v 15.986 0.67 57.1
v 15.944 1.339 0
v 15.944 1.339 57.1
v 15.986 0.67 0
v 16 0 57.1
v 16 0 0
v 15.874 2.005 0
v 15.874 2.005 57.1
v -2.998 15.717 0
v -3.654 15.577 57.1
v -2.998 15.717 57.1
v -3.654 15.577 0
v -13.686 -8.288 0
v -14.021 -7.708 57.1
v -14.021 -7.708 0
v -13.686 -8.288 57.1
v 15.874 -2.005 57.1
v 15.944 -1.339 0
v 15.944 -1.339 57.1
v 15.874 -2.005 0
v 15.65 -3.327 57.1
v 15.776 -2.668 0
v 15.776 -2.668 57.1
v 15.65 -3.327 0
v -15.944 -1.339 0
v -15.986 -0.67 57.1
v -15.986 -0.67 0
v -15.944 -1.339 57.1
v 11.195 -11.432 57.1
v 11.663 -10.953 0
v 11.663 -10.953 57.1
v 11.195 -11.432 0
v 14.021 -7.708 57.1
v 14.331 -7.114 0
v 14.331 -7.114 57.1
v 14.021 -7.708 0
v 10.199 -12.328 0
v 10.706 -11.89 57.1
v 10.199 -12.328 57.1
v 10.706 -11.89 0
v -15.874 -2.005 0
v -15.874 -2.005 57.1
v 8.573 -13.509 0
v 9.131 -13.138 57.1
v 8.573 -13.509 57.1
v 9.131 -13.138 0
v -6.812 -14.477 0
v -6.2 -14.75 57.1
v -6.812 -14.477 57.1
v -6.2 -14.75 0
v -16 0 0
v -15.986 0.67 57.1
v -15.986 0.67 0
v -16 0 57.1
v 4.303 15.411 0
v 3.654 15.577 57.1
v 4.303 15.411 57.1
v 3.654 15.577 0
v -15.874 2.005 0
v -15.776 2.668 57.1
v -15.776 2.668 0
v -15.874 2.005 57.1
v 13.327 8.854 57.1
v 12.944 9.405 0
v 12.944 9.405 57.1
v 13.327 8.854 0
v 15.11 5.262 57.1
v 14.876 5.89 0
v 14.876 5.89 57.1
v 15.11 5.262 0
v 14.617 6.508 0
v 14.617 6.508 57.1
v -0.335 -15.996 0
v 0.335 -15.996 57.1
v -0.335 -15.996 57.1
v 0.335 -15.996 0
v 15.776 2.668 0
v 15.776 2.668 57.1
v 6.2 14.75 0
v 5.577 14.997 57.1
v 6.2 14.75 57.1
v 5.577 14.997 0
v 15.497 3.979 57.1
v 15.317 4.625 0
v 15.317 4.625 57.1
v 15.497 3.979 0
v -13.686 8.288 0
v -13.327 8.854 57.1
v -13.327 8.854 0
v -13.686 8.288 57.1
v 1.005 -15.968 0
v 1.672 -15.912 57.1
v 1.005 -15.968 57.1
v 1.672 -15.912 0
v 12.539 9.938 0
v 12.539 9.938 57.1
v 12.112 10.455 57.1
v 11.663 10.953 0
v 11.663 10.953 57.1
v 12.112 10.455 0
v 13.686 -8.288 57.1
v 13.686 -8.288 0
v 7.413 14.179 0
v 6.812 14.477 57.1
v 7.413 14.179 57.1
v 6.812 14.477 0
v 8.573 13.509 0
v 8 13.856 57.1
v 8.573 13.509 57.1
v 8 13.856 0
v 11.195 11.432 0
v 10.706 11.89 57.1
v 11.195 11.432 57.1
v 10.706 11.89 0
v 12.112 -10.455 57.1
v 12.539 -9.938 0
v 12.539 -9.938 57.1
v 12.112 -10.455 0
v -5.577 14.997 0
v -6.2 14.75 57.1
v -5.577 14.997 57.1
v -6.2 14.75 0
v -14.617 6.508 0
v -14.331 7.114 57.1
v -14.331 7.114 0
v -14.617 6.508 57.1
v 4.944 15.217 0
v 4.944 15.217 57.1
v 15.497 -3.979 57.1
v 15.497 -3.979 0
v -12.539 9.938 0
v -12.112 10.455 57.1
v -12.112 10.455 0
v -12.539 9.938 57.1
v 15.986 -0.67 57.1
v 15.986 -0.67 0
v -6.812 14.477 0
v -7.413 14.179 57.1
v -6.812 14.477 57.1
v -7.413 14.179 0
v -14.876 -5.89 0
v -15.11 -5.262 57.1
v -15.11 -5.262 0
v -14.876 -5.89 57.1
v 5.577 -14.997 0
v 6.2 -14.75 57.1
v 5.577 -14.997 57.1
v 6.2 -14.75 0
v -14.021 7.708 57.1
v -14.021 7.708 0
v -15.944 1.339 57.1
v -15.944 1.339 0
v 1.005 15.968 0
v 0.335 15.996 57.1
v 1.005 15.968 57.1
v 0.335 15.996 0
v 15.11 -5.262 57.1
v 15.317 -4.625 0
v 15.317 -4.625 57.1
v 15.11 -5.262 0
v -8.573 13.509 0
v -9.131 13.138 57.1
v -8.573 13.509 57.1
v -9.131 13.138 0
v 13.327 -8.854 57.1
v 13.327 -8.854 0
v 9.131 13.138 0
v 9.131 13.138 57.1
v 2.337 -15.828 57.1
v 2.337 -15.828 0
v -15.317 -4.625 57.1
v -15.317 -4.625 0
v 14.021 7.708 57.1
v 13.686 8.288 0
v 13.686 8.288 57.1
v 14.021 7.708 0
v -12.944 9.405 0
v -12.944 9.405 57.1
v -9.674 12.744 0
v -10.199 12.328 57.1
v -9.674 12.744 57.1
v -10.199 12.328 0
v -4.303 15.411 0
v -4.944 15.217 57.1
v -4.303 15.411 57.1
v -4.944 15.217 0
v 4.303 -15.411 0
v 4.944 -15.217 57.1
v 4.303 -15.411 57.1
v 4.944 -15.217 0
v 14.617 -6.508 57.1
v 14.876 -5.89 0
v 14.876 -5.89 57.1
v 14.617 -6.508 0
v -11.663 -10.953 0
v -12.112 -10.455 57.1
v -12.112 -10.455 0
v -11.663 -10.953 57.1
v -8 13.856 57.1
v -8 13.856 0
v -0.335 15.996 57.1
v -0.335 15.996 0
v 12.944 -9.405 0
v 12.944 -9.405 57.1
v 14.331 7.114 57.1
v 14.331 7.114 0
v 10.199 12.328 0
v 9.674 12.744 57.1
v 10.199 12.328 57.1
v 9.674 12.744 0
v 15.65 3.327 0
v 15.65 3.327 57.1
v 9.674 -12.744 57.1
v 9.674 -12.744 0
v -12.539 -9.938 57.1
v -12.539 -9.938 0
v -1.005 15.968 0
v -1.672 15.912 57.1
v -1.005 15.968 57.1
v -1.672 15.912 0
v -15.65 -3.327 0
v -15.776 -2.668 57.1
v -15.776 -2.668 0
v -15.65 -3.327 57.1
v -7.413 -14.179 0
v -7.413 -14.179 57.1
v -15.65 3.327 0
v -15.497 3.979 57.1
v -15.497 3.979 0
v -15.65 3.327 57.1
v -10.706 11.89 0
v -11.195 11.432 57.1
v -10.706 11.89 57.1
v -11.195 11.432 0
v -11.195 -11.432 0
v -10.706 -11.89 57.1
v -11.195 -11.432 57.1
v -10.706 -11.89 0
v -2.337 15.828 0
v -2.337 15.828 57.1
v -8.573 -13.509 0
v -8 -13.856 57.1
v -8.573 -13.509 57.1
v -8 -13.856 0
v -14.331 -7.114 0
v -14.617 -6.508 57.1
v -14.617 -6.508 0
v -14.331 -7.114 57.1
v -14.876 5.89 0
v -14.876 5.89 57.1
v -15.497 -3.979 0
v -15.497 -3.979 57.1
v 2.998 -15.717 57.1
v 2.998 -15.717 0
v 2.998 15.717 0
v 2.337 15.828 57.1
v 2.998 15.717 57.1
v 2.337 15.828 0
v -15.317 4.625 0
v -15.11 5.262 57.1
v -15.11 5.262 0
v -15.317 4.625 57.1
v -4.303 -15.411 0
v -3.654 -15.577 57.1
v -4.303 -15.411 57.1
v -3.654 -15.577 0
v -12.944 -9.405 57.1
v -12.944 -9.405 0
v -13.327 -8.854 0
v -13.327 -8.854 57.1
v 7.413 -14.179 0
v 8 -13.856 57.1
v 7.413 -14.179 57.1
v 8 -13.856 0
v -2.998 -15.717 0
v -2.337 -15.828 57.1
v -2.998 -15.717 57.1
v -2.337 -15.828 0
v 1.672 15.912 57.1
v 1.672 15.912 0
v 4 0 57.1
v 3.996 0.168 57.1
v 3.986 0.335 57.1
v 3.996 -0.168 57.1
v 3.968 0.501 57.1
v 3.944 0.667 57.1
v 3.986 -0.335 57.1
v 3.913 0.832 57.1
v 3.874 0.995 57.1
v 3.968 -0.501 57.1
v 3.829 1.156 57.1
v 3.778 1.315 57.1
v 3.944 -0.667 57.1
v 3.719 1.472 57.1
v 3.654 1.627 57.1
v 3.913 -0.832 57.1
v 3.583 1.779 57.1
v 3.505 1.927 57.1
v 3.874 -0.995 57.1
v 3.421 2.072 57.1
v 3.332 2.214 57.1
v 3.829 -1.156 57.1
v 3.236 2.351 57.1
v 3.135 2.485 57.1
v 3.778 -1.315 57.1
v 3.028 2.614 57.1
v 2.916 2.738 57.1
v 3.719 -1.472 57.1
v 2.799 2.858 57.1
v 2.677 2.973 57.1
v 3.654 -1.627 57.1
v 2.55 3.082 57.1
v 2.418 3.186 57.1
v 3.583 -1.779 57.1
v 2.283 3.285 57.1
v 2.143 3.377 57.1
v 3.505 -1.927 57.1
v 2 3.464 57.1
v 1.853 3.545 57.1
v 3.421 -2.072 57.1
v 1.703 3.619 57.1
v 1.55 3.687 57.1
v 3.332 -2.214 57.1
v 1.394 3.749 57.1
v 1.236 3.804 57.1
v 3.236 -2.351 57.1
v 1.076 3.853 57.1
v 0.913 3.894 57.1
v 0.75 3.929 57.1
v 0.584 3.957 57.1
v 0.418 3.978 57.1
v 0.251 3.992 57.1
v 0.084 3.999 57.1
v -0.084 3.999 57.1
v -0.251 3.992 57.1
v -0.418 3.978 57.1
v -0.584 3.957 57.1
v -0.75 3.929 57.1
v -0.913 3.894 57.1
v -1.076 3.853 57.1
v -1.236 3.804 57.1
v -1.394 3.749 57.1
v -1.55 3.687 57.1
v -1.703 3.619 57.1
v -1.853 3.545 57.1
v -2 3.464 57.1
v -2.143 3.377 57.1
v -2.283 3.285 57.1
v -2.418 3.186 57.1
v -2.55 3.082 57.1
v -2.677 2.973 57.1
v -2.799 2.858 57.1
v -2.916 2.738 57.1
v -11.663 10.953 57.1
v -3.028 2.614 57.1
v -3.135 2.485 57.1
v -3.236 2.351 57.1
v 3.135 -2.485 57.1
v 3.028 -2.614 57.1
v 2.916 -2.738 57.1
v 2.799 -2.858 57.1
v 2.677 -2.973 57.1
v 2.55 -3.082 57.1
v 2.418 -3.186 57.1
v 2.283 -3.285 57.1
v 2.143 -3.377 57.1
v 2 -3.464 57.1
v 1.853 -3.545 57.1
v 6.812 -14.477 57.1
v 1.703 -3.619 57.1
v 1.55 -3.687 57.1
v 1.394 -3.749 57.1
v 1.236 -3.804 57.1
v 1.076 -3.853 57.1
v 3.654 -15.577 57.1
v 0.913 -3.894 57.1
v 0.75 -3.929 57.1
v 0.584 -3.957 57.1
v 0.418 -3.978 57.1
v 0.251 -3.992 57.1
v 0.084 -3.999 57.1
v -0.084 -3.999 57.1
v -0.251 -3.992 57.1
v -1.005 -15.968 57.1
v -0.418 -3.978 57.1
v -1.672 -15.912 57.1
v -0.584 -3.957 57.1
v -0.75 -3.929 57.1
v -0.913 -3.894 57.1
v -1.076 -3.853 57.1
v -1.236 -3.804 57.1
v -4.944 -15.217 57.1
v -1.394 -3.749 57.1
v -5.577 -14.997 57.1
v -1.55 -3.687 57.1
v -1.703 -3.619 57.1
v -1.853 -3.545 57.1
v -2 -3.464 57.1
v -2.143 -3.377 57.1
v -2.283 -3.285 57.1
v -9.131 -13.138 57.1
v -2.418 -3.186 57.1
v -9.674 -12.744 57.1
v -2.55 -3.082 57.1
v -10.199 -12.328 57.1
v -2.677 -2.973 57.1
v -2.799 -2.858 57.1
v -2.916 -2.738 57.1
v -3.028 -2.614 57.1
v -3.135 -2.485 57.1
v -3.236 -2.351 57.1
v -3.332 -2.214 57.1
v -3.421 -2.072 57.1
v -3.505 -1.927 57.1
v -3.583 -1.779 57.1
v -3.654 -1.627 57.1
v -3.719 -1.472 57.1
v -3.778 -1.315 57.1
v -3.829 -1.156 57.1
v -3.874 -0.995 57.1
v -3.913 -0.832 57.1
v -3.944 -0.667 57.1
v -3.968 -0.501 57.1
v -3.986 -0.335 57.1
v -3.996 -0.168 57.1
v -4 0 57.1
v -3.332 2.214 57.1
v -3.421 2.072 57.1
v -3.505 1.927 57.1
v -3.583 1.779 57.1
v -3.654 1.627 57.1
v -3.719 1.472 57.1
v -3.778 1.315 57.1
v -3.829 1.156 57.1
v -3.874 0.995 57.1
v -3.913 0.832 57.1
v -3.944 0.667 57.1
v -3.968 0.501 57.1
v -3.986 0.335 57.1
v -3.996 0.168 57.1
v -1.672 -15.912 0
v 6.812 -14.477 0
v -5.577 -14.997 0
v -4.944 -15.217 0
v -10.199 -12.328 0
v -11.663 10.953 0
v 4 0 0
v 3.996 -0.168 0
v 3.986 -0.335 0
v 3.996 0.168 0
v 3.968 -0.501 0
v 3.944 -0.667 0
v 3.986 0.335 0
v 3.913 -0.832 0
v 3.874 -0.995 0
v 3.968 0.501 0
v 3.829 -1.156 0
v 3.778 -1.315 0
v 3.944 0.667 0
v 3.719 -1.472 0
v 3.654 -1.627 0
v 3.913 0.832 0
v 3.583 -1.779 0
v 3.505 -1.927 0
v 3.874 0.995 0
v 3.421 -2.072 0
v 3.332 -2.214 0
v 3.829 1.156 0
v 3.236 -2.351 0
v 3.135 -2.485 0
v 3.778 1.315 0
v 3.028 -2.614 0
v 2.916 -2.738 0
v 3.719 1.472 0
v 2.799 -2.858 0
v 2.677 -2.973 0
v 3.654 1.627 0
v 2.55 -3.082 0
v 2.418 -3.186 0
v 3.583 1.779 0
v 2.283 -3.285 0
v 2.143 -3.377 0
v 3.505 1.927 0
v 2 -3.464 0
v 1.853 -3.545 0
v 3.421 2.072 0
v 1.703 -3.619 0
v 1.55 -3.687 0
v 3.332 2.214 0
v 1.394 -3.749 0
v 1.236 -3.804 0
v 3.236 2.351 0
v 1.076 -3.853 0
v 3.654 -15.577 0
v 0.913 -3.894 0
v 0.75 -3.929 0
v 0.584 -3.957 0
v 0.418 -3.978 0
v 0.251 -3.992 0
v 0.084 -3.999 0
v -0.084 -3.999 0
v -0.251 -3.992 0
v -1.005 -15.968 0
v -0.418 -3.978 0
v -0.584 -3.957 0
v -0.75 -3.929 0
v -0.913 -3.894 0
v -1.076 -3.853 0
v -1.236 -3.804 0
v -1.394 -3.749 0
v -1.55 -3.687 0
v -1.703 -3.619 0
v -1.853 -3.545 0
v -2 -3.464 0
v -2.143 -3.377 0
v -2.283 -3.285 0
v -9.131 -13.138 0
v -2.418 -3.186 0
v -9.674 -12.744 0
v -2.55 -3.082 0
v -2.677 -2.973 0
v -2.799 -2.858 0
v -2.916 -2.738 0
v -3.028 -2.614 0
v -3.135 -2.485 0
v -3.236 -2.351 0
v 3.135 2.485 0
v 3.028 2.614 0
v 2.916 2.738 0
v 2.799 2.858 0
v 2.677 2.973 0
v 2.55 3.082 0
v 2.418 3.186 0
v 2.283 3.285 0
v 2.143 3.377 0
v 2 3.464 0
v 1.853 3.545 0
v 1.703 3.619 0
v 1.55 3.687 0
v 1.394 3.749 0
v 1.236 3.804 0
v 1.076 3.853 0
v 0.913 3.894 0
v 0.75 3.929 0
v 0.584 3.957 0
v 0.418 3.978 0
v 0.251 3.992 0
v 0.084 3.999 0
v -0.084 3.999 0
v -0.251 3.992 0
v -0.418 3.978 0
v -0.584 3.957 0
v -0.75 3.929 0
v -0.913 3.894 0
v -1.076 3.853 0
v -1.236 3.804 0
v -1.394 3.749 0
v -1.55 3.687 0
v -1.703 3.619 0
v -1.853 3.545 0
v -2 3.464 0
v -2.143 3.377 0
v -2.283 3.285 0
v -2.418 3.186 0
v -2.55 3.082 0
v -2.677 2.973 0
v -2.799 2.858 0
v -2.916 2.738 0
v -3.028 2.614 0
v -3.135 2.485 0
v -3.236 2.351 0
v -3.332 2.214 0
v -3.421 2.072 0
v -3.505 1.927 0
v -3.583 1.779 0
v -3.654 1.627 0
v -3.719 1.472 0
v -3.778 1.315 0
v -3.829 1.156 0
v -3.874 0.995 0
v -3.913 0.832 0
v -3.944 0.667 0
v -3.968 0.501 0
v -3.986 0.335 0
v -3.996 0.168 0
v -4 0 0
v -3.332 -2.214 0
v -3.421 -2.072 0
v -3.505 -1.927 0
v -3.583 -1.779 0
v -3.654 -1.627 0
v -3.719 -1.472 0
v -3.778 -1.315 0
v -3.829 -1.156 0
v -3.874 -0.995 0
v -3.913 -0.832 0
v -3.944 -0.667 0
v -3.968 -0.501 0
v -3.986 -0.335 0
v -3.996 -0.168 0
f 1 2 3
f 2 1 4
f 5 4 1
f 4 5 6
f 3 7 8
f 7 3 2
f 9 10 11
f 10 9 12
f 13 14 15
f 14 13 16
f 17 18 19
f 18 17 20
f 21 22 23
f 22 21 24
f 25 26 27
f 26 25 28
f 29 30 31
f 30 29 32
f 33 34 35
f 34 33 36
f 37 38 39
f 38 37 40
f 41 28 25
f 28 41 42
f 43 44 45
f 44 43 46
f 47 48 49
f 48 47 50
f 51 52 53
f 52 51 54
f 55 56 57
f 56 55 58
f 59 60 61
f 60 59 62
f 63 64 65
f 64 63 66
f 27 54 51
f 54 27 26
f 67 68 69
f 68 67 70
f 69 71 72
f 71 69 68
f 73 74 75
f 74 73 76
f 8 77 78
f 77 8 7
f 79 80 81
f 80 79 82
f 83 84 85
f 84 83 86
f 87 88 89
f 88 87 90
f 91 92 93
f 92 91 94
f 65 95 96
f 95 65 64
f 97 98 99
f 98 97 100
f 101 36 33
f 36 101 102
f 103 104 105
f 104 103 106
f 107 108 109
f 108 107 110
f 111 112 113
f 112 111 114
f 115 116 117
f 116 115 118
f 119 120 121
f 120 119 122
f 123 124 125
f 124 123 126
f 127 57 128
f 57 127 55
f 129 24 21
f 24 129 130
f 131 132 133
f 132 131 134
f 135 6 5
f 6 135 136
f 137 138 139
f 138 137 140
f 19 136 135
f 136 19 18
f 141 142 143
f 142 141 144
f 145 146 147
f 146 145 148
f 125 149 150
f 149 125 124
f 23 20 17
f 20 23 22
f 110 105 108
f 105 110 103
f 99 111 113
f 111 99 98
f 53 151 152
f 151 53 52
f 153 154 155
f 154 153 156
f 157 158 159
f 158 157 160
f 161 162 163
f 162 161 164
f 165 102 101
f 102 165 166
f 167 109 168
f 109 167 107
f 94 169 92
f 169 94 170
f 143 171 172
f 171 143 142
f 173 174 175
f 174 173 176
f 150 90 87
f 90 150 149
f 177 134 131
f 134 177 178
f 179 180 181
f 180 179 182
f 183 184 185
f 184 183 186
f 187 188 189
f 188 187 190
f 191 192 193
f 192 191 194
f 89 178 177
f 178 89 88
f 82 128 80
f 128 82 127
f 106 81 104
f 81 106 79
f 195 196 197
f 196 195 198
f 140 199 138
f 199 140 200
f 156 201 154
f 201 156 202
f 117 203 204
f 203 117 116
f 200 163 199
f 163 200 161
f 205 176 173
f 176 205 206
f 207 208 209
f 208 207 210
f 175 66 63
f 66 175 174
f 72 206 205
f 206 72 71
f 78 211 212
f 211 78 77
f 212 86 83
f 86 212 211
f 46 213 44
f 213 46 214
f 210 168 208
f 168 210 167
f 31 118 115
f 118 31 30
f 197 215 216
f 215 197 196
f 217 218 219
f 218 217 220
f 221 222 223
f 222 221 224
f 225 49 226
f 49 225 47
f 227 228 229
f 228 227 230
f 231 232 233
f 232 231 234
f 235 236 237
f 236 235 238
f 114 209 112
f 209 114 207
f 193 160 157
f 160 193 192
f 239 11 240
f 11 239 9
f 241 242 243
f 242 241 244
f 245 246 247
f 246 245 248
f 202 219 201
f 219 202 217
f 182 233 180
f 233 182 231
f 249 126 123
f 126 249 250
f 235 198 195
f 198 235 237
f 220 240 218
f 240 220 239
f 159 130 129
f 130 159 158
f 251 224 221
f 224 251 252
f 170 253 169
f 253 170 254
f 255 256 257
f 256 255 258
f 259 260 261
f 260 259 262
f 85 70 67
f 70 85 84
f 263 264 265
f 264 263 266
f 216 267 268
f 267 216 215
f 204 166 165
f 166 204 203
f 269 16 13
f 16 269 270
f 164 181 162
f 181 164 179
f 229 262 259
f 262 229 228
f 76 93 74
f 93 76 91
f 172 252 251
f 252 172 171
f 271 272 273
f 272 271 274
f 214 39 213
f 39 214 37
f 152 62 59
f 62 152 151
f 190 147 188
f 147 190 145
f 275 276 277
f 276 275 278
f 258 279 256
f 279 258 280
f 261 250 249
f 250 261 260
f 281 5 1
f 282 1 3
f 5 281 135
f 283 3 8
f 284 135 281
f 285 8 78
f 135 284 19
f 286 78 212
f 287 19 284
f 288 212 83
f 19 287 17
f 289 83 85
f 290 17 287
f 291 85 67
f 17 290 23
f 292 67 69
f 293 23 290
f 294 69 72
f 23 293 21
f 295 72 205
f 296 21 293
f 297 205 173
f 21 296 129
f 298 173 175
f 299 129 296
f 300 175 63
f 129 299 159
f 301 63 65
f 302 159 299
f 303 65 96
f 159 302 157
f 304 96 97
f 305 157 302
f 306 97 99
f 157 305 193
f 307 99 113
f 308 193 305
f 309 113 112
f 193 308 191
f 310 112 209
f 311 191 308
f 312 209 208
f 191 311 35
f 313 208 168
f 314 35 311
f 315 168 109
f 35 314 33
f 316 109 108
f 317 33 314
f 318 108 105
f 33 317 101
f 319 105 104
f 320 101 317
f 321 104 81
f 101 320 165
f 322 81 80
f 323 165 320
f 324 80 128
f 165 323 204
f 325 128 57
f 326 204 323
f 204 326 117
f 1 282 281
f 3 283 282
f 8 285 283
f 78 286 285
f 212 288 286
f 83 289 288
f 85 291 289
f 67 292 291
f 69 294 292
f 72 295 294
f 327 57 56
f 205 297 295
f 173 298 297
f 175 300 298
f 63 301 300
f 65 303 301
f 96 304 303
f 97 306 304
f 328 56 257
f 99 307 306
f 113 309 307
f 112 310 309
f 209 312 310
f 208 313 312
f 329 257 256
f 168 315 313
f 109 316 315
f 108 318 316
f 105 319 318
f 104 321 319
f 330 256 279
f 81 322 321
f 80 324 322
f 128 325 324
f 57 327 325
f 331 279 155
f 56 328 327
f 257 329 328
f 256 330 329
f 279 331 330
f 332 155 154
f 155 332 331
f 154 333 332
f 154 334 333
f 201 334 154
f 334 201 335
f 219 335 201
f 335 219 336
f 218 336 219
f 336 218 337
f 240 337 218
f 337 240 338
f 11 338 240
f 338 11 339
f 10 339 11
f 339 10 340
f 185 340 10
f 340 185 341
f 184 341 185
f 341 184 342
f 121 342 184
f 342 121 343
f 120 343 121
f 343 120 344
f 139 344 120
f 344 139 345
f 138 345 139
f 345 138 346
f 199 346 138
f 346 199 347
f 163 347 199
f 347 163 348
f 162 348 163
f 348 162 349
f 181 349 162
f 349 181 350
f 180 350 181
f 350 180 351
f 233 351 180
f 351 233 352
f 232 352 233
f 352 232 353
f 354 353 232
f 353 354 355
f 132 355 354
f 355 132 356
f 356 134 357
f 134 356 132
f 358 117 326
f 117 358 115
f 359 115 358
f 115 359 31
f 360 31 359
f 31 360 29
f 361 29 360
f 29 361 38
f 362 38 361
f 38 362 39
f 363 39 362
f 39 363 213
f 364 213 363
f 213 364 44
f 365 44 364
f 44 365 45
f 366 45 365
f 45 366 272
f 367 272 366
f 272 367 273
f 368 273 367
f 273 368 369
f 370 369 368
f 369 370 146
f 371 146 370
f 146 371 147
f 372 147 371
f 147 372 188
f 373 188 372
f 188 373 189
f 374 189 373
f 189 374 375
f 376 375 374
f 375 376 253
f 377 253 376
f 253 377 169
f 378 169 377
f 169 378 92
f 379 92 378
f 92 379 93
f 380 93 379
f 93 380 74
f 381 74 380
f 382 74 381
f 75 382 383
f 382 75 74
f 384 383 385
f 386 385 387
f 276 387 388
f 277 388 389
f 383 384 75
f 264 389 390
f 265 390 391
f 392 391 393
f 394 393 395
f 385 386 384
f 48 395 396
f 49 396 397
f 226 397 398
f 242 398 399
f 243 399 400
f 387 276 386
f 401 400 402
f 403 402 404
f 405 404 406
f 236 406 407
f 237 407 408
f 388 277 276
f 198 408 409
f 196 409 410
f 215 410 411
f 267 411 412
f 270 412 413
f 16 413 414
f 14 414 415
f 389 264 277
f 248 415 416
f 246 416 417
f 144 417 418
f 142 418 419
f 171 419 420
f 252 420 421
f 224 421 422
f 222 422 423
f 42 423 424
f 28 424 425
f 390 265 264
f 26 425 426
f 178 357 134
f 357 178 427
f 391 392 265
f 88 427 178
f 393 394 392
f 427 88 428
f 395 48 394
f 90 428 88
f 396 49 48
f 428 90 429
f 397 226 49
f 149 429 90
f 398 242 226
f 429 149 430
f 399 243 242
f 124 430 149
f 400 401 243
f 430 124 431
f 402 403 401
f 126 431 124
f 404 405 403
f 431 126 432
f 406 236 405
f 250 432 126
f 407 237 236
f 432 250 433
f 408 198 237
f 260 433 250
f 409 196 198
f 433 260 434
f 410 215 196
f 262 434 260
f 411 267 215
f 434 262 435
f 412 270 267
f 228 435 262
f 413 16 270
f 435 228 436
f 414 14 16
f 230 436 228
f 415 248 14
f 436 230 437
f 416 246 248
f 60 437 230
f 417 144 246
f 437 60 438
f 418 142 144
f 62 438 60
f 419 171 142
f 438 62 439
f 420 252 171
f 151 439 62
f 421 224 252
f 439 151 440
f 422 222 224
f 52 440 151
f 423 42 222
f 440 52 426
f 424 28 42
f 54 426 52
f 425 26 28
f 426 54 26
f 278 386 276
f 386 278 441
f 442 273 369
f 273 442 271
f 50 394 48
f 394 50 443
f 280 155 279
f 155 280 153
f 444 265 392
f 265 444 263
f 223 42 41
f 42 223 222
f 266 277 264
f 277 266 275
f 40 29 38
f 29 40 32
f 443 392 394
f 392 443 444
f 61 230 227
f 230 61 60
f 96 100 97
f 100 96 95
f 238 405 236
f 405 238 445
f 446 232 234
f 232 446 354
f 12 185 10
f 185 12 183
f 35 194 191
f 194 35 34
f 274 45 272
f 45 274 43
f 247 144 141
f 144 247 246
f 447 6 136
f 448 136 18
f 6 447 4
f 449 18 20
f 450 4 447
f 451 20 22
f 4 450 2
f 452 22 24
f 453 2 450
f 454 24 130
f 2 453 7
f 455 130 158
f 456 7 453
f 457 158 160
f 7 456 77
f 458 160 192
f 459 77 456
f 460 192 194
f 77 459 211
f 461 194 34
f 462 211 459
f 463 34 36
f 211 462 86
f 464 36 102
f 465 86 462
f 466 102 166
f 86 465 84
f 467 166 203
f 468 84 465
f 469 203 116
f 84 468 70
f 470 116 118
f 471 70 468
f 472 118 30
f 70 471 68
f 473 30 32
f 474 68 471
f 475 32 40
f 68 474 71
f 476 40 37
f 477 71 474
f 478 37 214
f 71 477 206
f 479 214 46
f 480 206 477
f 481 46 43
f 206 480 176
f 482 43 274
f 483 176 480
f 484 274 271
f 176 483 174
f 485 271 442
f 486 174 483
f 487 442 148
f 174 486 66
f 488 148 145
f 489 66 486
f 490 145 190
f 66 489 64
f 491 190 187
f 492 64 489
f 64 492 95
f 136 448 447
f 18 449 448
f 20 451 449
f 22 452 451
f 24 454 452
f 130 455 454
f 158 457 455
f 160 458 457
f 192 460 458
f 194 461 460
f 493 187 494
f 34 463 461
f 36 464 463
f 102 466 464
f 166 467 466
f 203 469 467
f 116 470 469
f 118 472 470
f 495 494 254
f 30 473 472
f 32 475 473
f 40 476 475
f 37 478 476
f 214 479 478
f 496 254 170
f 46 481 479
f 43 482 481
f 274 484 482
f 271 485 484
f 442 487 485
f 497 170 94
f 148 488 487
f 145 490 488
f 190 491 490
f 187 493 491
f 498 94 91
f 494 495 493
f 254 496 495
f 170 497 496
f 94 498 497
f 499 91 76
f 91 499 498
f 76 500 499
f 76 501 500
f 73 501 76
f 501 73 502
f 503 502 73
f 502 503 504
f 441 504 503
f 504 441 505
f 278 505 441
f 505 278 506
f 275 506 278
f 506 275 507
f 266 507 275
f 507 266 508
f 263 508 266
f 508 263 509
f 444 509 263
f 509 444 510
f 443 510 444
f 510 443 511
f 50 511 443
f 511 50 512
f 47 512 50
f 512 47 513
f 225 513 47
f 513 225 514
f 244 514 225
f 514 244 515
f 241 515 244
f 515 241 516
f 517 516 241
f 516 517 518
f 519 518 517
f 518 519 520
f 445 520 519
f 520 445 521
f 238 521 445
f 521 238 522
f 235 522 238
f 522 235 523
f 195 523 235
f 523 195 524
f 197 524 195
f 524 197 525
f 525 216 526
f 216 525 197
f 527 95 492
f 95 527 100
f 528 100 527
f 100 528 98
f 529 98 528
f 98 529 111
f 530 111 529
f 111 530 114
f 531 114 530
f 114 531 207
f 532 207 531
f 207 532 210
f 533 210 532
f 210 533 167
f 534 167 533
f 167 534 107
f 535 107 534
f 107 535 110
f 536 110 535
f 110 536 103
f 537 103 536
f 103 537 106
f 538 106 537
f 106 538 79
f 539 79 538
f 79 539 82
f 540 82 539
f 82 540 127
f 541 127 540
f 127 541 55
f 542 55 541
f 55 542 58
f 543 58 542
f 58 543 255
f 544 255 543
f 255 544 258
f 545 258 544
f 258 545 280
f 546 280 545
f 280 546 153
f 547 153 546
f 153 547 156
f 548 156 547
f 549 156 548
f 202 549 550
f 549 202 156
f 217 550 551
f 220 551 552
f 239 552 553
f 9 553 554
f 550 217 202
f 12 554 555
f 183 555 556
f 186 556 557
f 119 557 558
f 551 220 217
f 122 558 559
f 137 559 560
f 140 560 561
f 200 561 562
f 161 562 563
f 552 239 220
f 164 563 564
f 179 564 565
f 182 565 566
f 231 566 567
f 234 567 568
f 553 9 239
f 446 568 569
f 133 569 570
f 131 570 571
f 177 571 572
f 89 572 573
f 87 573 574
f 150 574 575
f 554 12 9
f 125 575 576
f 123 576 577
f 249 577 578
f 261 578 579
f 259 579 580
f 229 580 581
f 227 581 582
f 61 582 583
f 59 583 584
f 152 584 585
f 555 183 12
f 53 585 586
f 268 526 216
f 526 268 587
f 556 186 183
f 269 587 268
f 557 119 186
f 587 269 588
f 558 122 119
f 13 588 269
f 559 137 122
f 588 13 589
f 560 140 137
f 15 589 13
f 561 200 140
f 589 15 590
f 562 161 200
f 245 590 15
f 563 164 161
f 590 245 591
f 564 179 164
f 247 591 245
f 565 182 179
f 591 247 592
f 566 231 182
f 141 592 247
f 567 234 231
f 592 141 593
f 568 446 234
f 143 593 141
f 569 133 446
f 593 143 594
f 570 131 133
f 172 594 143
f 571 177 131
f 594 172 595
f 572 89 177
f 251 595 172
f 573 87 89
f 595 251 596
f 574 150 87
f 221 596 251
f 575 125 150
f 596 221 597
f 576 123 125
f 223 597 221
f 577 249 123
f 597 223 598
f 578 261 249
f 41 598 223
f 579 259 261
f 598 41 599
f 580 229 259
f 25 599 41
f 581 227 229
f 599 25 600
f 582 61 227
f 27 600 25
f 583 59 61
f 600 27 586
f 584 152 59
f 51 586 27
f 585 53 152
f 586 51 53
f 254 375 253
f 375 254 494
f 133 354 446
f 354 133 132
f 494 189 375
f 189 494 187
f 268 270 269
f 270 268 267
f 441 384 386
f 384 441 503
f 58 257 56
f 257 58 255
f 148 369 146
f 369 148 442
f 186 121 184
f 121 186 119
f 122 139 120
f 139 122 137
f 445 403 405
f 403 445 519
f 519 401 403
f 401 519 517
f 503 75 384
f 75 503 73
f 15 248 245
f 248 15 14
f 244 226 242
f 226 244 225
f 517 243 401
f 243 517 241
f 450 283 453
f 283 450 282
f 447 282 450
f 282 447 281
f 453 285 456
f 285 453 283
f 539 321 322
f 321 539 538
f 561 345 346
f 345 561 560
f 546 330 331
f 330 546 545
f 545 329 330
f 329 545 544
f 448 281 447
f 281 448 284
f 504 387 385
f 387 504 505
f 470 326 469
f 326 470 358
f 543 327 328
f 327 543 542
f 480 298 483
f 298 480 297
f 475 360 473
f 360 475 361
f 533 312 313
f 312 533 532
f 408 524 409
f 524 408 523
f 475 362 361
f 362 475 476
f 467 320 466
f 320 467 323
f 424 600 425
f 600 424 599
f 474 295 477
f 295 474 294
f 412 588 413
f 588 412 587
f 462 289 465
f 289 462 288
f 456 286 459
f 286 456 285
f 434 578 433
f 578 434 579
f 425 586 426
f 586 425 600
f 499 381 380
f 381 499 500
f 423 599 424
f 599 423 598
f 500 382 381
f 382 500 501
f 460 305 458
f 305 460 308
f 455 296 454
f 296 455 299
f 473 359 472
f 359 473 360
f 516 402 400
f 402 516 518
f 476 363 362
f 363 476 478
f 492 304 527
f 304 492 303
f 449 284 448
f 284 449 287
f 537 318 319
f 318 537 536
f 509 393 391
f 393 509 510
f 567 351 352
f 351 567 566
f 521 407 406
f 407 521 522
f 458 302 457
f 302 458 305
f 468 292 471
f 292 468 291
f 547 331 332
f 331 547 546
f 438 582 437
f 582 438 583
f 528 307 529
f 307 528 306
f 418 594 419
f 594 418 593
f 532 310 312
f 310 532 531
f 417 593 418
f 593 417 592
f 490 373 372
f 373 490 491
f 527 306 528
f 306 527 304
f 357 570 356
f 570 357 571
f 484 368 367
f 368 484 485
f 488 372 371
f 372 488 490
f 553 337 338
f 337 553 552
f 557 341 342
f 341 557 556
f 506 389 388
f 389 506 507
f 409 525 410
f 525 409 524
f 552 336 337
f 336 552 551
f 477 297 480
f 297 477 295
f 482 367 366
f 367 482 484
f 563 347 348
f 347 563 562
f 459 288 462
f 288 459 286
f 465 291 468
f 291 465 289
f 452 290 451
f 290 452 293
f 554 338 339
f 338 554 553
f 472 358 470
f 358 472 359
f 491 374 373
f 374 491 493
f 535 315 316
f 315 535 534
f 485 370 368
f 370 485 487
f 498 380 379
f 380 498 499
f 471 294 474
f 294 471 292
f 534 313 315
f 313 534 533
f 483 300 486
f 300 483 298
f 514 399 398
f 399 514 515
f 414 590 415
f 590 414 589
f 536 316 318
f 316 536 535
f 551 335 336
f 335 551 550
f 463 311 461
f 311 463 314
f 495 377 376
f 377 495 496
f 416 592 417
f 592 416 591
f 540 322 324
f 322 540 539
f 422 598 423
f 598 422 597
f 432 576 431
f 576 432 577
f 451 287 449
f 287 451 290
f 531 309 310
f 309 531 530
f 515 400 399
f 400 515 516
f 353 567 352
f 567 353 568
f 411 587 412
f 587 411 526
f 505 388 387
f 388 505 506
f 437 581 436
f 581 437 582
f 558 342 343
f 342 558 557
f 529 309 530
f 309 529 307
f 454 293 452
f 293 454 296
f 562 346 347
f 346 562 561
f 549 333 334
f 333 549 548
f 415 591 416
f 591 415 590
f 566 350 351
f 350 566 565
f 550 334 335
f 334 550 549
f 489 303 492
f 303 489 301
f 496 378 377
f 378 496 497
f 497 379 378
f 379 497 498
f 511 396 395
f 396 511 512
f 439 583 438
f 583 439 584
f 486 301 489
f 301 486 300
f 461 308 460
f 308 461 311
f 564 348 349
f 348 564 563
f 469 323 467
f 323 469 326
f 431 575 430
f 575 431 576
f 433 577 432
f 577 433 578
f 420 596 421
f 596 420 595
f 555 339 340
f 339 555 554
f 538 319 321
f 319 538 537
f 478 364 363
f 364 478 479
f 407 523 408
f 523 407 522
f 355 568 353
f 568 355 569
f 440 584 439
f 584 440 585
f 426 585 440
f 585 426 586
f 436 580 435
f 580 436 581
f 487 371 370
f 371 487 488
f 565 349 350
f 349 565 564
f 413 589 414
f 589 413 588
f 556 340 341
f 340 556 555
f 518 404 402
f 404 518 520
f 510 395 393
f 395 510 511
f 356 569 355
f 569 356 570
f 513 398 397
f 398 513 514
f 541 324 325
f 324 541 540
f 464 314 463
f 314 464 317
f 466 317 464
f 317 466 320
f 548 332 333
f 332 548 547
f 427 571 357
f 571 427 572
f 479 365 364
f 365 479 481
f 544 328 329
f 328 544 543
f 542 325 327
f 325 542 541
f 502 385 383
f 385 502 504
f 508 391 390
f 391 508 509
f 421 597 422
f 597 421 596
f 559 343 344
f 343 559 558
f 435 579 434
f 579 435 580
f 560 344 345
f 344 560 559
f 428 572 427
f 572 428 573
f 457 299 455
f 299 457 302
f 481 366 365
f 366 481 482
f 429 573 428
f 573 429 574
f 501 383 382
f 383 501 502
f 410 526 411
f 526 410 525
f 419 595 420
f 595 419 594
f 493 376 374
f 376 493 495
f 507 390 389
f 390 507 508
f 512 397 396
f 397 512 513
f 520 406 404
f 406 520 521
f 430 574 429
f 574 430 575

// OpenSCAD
$fn = 150;
difference() { cylinder (r=32/2, h =57.1);
cylinder (r=8/2, h =57.1);
}
